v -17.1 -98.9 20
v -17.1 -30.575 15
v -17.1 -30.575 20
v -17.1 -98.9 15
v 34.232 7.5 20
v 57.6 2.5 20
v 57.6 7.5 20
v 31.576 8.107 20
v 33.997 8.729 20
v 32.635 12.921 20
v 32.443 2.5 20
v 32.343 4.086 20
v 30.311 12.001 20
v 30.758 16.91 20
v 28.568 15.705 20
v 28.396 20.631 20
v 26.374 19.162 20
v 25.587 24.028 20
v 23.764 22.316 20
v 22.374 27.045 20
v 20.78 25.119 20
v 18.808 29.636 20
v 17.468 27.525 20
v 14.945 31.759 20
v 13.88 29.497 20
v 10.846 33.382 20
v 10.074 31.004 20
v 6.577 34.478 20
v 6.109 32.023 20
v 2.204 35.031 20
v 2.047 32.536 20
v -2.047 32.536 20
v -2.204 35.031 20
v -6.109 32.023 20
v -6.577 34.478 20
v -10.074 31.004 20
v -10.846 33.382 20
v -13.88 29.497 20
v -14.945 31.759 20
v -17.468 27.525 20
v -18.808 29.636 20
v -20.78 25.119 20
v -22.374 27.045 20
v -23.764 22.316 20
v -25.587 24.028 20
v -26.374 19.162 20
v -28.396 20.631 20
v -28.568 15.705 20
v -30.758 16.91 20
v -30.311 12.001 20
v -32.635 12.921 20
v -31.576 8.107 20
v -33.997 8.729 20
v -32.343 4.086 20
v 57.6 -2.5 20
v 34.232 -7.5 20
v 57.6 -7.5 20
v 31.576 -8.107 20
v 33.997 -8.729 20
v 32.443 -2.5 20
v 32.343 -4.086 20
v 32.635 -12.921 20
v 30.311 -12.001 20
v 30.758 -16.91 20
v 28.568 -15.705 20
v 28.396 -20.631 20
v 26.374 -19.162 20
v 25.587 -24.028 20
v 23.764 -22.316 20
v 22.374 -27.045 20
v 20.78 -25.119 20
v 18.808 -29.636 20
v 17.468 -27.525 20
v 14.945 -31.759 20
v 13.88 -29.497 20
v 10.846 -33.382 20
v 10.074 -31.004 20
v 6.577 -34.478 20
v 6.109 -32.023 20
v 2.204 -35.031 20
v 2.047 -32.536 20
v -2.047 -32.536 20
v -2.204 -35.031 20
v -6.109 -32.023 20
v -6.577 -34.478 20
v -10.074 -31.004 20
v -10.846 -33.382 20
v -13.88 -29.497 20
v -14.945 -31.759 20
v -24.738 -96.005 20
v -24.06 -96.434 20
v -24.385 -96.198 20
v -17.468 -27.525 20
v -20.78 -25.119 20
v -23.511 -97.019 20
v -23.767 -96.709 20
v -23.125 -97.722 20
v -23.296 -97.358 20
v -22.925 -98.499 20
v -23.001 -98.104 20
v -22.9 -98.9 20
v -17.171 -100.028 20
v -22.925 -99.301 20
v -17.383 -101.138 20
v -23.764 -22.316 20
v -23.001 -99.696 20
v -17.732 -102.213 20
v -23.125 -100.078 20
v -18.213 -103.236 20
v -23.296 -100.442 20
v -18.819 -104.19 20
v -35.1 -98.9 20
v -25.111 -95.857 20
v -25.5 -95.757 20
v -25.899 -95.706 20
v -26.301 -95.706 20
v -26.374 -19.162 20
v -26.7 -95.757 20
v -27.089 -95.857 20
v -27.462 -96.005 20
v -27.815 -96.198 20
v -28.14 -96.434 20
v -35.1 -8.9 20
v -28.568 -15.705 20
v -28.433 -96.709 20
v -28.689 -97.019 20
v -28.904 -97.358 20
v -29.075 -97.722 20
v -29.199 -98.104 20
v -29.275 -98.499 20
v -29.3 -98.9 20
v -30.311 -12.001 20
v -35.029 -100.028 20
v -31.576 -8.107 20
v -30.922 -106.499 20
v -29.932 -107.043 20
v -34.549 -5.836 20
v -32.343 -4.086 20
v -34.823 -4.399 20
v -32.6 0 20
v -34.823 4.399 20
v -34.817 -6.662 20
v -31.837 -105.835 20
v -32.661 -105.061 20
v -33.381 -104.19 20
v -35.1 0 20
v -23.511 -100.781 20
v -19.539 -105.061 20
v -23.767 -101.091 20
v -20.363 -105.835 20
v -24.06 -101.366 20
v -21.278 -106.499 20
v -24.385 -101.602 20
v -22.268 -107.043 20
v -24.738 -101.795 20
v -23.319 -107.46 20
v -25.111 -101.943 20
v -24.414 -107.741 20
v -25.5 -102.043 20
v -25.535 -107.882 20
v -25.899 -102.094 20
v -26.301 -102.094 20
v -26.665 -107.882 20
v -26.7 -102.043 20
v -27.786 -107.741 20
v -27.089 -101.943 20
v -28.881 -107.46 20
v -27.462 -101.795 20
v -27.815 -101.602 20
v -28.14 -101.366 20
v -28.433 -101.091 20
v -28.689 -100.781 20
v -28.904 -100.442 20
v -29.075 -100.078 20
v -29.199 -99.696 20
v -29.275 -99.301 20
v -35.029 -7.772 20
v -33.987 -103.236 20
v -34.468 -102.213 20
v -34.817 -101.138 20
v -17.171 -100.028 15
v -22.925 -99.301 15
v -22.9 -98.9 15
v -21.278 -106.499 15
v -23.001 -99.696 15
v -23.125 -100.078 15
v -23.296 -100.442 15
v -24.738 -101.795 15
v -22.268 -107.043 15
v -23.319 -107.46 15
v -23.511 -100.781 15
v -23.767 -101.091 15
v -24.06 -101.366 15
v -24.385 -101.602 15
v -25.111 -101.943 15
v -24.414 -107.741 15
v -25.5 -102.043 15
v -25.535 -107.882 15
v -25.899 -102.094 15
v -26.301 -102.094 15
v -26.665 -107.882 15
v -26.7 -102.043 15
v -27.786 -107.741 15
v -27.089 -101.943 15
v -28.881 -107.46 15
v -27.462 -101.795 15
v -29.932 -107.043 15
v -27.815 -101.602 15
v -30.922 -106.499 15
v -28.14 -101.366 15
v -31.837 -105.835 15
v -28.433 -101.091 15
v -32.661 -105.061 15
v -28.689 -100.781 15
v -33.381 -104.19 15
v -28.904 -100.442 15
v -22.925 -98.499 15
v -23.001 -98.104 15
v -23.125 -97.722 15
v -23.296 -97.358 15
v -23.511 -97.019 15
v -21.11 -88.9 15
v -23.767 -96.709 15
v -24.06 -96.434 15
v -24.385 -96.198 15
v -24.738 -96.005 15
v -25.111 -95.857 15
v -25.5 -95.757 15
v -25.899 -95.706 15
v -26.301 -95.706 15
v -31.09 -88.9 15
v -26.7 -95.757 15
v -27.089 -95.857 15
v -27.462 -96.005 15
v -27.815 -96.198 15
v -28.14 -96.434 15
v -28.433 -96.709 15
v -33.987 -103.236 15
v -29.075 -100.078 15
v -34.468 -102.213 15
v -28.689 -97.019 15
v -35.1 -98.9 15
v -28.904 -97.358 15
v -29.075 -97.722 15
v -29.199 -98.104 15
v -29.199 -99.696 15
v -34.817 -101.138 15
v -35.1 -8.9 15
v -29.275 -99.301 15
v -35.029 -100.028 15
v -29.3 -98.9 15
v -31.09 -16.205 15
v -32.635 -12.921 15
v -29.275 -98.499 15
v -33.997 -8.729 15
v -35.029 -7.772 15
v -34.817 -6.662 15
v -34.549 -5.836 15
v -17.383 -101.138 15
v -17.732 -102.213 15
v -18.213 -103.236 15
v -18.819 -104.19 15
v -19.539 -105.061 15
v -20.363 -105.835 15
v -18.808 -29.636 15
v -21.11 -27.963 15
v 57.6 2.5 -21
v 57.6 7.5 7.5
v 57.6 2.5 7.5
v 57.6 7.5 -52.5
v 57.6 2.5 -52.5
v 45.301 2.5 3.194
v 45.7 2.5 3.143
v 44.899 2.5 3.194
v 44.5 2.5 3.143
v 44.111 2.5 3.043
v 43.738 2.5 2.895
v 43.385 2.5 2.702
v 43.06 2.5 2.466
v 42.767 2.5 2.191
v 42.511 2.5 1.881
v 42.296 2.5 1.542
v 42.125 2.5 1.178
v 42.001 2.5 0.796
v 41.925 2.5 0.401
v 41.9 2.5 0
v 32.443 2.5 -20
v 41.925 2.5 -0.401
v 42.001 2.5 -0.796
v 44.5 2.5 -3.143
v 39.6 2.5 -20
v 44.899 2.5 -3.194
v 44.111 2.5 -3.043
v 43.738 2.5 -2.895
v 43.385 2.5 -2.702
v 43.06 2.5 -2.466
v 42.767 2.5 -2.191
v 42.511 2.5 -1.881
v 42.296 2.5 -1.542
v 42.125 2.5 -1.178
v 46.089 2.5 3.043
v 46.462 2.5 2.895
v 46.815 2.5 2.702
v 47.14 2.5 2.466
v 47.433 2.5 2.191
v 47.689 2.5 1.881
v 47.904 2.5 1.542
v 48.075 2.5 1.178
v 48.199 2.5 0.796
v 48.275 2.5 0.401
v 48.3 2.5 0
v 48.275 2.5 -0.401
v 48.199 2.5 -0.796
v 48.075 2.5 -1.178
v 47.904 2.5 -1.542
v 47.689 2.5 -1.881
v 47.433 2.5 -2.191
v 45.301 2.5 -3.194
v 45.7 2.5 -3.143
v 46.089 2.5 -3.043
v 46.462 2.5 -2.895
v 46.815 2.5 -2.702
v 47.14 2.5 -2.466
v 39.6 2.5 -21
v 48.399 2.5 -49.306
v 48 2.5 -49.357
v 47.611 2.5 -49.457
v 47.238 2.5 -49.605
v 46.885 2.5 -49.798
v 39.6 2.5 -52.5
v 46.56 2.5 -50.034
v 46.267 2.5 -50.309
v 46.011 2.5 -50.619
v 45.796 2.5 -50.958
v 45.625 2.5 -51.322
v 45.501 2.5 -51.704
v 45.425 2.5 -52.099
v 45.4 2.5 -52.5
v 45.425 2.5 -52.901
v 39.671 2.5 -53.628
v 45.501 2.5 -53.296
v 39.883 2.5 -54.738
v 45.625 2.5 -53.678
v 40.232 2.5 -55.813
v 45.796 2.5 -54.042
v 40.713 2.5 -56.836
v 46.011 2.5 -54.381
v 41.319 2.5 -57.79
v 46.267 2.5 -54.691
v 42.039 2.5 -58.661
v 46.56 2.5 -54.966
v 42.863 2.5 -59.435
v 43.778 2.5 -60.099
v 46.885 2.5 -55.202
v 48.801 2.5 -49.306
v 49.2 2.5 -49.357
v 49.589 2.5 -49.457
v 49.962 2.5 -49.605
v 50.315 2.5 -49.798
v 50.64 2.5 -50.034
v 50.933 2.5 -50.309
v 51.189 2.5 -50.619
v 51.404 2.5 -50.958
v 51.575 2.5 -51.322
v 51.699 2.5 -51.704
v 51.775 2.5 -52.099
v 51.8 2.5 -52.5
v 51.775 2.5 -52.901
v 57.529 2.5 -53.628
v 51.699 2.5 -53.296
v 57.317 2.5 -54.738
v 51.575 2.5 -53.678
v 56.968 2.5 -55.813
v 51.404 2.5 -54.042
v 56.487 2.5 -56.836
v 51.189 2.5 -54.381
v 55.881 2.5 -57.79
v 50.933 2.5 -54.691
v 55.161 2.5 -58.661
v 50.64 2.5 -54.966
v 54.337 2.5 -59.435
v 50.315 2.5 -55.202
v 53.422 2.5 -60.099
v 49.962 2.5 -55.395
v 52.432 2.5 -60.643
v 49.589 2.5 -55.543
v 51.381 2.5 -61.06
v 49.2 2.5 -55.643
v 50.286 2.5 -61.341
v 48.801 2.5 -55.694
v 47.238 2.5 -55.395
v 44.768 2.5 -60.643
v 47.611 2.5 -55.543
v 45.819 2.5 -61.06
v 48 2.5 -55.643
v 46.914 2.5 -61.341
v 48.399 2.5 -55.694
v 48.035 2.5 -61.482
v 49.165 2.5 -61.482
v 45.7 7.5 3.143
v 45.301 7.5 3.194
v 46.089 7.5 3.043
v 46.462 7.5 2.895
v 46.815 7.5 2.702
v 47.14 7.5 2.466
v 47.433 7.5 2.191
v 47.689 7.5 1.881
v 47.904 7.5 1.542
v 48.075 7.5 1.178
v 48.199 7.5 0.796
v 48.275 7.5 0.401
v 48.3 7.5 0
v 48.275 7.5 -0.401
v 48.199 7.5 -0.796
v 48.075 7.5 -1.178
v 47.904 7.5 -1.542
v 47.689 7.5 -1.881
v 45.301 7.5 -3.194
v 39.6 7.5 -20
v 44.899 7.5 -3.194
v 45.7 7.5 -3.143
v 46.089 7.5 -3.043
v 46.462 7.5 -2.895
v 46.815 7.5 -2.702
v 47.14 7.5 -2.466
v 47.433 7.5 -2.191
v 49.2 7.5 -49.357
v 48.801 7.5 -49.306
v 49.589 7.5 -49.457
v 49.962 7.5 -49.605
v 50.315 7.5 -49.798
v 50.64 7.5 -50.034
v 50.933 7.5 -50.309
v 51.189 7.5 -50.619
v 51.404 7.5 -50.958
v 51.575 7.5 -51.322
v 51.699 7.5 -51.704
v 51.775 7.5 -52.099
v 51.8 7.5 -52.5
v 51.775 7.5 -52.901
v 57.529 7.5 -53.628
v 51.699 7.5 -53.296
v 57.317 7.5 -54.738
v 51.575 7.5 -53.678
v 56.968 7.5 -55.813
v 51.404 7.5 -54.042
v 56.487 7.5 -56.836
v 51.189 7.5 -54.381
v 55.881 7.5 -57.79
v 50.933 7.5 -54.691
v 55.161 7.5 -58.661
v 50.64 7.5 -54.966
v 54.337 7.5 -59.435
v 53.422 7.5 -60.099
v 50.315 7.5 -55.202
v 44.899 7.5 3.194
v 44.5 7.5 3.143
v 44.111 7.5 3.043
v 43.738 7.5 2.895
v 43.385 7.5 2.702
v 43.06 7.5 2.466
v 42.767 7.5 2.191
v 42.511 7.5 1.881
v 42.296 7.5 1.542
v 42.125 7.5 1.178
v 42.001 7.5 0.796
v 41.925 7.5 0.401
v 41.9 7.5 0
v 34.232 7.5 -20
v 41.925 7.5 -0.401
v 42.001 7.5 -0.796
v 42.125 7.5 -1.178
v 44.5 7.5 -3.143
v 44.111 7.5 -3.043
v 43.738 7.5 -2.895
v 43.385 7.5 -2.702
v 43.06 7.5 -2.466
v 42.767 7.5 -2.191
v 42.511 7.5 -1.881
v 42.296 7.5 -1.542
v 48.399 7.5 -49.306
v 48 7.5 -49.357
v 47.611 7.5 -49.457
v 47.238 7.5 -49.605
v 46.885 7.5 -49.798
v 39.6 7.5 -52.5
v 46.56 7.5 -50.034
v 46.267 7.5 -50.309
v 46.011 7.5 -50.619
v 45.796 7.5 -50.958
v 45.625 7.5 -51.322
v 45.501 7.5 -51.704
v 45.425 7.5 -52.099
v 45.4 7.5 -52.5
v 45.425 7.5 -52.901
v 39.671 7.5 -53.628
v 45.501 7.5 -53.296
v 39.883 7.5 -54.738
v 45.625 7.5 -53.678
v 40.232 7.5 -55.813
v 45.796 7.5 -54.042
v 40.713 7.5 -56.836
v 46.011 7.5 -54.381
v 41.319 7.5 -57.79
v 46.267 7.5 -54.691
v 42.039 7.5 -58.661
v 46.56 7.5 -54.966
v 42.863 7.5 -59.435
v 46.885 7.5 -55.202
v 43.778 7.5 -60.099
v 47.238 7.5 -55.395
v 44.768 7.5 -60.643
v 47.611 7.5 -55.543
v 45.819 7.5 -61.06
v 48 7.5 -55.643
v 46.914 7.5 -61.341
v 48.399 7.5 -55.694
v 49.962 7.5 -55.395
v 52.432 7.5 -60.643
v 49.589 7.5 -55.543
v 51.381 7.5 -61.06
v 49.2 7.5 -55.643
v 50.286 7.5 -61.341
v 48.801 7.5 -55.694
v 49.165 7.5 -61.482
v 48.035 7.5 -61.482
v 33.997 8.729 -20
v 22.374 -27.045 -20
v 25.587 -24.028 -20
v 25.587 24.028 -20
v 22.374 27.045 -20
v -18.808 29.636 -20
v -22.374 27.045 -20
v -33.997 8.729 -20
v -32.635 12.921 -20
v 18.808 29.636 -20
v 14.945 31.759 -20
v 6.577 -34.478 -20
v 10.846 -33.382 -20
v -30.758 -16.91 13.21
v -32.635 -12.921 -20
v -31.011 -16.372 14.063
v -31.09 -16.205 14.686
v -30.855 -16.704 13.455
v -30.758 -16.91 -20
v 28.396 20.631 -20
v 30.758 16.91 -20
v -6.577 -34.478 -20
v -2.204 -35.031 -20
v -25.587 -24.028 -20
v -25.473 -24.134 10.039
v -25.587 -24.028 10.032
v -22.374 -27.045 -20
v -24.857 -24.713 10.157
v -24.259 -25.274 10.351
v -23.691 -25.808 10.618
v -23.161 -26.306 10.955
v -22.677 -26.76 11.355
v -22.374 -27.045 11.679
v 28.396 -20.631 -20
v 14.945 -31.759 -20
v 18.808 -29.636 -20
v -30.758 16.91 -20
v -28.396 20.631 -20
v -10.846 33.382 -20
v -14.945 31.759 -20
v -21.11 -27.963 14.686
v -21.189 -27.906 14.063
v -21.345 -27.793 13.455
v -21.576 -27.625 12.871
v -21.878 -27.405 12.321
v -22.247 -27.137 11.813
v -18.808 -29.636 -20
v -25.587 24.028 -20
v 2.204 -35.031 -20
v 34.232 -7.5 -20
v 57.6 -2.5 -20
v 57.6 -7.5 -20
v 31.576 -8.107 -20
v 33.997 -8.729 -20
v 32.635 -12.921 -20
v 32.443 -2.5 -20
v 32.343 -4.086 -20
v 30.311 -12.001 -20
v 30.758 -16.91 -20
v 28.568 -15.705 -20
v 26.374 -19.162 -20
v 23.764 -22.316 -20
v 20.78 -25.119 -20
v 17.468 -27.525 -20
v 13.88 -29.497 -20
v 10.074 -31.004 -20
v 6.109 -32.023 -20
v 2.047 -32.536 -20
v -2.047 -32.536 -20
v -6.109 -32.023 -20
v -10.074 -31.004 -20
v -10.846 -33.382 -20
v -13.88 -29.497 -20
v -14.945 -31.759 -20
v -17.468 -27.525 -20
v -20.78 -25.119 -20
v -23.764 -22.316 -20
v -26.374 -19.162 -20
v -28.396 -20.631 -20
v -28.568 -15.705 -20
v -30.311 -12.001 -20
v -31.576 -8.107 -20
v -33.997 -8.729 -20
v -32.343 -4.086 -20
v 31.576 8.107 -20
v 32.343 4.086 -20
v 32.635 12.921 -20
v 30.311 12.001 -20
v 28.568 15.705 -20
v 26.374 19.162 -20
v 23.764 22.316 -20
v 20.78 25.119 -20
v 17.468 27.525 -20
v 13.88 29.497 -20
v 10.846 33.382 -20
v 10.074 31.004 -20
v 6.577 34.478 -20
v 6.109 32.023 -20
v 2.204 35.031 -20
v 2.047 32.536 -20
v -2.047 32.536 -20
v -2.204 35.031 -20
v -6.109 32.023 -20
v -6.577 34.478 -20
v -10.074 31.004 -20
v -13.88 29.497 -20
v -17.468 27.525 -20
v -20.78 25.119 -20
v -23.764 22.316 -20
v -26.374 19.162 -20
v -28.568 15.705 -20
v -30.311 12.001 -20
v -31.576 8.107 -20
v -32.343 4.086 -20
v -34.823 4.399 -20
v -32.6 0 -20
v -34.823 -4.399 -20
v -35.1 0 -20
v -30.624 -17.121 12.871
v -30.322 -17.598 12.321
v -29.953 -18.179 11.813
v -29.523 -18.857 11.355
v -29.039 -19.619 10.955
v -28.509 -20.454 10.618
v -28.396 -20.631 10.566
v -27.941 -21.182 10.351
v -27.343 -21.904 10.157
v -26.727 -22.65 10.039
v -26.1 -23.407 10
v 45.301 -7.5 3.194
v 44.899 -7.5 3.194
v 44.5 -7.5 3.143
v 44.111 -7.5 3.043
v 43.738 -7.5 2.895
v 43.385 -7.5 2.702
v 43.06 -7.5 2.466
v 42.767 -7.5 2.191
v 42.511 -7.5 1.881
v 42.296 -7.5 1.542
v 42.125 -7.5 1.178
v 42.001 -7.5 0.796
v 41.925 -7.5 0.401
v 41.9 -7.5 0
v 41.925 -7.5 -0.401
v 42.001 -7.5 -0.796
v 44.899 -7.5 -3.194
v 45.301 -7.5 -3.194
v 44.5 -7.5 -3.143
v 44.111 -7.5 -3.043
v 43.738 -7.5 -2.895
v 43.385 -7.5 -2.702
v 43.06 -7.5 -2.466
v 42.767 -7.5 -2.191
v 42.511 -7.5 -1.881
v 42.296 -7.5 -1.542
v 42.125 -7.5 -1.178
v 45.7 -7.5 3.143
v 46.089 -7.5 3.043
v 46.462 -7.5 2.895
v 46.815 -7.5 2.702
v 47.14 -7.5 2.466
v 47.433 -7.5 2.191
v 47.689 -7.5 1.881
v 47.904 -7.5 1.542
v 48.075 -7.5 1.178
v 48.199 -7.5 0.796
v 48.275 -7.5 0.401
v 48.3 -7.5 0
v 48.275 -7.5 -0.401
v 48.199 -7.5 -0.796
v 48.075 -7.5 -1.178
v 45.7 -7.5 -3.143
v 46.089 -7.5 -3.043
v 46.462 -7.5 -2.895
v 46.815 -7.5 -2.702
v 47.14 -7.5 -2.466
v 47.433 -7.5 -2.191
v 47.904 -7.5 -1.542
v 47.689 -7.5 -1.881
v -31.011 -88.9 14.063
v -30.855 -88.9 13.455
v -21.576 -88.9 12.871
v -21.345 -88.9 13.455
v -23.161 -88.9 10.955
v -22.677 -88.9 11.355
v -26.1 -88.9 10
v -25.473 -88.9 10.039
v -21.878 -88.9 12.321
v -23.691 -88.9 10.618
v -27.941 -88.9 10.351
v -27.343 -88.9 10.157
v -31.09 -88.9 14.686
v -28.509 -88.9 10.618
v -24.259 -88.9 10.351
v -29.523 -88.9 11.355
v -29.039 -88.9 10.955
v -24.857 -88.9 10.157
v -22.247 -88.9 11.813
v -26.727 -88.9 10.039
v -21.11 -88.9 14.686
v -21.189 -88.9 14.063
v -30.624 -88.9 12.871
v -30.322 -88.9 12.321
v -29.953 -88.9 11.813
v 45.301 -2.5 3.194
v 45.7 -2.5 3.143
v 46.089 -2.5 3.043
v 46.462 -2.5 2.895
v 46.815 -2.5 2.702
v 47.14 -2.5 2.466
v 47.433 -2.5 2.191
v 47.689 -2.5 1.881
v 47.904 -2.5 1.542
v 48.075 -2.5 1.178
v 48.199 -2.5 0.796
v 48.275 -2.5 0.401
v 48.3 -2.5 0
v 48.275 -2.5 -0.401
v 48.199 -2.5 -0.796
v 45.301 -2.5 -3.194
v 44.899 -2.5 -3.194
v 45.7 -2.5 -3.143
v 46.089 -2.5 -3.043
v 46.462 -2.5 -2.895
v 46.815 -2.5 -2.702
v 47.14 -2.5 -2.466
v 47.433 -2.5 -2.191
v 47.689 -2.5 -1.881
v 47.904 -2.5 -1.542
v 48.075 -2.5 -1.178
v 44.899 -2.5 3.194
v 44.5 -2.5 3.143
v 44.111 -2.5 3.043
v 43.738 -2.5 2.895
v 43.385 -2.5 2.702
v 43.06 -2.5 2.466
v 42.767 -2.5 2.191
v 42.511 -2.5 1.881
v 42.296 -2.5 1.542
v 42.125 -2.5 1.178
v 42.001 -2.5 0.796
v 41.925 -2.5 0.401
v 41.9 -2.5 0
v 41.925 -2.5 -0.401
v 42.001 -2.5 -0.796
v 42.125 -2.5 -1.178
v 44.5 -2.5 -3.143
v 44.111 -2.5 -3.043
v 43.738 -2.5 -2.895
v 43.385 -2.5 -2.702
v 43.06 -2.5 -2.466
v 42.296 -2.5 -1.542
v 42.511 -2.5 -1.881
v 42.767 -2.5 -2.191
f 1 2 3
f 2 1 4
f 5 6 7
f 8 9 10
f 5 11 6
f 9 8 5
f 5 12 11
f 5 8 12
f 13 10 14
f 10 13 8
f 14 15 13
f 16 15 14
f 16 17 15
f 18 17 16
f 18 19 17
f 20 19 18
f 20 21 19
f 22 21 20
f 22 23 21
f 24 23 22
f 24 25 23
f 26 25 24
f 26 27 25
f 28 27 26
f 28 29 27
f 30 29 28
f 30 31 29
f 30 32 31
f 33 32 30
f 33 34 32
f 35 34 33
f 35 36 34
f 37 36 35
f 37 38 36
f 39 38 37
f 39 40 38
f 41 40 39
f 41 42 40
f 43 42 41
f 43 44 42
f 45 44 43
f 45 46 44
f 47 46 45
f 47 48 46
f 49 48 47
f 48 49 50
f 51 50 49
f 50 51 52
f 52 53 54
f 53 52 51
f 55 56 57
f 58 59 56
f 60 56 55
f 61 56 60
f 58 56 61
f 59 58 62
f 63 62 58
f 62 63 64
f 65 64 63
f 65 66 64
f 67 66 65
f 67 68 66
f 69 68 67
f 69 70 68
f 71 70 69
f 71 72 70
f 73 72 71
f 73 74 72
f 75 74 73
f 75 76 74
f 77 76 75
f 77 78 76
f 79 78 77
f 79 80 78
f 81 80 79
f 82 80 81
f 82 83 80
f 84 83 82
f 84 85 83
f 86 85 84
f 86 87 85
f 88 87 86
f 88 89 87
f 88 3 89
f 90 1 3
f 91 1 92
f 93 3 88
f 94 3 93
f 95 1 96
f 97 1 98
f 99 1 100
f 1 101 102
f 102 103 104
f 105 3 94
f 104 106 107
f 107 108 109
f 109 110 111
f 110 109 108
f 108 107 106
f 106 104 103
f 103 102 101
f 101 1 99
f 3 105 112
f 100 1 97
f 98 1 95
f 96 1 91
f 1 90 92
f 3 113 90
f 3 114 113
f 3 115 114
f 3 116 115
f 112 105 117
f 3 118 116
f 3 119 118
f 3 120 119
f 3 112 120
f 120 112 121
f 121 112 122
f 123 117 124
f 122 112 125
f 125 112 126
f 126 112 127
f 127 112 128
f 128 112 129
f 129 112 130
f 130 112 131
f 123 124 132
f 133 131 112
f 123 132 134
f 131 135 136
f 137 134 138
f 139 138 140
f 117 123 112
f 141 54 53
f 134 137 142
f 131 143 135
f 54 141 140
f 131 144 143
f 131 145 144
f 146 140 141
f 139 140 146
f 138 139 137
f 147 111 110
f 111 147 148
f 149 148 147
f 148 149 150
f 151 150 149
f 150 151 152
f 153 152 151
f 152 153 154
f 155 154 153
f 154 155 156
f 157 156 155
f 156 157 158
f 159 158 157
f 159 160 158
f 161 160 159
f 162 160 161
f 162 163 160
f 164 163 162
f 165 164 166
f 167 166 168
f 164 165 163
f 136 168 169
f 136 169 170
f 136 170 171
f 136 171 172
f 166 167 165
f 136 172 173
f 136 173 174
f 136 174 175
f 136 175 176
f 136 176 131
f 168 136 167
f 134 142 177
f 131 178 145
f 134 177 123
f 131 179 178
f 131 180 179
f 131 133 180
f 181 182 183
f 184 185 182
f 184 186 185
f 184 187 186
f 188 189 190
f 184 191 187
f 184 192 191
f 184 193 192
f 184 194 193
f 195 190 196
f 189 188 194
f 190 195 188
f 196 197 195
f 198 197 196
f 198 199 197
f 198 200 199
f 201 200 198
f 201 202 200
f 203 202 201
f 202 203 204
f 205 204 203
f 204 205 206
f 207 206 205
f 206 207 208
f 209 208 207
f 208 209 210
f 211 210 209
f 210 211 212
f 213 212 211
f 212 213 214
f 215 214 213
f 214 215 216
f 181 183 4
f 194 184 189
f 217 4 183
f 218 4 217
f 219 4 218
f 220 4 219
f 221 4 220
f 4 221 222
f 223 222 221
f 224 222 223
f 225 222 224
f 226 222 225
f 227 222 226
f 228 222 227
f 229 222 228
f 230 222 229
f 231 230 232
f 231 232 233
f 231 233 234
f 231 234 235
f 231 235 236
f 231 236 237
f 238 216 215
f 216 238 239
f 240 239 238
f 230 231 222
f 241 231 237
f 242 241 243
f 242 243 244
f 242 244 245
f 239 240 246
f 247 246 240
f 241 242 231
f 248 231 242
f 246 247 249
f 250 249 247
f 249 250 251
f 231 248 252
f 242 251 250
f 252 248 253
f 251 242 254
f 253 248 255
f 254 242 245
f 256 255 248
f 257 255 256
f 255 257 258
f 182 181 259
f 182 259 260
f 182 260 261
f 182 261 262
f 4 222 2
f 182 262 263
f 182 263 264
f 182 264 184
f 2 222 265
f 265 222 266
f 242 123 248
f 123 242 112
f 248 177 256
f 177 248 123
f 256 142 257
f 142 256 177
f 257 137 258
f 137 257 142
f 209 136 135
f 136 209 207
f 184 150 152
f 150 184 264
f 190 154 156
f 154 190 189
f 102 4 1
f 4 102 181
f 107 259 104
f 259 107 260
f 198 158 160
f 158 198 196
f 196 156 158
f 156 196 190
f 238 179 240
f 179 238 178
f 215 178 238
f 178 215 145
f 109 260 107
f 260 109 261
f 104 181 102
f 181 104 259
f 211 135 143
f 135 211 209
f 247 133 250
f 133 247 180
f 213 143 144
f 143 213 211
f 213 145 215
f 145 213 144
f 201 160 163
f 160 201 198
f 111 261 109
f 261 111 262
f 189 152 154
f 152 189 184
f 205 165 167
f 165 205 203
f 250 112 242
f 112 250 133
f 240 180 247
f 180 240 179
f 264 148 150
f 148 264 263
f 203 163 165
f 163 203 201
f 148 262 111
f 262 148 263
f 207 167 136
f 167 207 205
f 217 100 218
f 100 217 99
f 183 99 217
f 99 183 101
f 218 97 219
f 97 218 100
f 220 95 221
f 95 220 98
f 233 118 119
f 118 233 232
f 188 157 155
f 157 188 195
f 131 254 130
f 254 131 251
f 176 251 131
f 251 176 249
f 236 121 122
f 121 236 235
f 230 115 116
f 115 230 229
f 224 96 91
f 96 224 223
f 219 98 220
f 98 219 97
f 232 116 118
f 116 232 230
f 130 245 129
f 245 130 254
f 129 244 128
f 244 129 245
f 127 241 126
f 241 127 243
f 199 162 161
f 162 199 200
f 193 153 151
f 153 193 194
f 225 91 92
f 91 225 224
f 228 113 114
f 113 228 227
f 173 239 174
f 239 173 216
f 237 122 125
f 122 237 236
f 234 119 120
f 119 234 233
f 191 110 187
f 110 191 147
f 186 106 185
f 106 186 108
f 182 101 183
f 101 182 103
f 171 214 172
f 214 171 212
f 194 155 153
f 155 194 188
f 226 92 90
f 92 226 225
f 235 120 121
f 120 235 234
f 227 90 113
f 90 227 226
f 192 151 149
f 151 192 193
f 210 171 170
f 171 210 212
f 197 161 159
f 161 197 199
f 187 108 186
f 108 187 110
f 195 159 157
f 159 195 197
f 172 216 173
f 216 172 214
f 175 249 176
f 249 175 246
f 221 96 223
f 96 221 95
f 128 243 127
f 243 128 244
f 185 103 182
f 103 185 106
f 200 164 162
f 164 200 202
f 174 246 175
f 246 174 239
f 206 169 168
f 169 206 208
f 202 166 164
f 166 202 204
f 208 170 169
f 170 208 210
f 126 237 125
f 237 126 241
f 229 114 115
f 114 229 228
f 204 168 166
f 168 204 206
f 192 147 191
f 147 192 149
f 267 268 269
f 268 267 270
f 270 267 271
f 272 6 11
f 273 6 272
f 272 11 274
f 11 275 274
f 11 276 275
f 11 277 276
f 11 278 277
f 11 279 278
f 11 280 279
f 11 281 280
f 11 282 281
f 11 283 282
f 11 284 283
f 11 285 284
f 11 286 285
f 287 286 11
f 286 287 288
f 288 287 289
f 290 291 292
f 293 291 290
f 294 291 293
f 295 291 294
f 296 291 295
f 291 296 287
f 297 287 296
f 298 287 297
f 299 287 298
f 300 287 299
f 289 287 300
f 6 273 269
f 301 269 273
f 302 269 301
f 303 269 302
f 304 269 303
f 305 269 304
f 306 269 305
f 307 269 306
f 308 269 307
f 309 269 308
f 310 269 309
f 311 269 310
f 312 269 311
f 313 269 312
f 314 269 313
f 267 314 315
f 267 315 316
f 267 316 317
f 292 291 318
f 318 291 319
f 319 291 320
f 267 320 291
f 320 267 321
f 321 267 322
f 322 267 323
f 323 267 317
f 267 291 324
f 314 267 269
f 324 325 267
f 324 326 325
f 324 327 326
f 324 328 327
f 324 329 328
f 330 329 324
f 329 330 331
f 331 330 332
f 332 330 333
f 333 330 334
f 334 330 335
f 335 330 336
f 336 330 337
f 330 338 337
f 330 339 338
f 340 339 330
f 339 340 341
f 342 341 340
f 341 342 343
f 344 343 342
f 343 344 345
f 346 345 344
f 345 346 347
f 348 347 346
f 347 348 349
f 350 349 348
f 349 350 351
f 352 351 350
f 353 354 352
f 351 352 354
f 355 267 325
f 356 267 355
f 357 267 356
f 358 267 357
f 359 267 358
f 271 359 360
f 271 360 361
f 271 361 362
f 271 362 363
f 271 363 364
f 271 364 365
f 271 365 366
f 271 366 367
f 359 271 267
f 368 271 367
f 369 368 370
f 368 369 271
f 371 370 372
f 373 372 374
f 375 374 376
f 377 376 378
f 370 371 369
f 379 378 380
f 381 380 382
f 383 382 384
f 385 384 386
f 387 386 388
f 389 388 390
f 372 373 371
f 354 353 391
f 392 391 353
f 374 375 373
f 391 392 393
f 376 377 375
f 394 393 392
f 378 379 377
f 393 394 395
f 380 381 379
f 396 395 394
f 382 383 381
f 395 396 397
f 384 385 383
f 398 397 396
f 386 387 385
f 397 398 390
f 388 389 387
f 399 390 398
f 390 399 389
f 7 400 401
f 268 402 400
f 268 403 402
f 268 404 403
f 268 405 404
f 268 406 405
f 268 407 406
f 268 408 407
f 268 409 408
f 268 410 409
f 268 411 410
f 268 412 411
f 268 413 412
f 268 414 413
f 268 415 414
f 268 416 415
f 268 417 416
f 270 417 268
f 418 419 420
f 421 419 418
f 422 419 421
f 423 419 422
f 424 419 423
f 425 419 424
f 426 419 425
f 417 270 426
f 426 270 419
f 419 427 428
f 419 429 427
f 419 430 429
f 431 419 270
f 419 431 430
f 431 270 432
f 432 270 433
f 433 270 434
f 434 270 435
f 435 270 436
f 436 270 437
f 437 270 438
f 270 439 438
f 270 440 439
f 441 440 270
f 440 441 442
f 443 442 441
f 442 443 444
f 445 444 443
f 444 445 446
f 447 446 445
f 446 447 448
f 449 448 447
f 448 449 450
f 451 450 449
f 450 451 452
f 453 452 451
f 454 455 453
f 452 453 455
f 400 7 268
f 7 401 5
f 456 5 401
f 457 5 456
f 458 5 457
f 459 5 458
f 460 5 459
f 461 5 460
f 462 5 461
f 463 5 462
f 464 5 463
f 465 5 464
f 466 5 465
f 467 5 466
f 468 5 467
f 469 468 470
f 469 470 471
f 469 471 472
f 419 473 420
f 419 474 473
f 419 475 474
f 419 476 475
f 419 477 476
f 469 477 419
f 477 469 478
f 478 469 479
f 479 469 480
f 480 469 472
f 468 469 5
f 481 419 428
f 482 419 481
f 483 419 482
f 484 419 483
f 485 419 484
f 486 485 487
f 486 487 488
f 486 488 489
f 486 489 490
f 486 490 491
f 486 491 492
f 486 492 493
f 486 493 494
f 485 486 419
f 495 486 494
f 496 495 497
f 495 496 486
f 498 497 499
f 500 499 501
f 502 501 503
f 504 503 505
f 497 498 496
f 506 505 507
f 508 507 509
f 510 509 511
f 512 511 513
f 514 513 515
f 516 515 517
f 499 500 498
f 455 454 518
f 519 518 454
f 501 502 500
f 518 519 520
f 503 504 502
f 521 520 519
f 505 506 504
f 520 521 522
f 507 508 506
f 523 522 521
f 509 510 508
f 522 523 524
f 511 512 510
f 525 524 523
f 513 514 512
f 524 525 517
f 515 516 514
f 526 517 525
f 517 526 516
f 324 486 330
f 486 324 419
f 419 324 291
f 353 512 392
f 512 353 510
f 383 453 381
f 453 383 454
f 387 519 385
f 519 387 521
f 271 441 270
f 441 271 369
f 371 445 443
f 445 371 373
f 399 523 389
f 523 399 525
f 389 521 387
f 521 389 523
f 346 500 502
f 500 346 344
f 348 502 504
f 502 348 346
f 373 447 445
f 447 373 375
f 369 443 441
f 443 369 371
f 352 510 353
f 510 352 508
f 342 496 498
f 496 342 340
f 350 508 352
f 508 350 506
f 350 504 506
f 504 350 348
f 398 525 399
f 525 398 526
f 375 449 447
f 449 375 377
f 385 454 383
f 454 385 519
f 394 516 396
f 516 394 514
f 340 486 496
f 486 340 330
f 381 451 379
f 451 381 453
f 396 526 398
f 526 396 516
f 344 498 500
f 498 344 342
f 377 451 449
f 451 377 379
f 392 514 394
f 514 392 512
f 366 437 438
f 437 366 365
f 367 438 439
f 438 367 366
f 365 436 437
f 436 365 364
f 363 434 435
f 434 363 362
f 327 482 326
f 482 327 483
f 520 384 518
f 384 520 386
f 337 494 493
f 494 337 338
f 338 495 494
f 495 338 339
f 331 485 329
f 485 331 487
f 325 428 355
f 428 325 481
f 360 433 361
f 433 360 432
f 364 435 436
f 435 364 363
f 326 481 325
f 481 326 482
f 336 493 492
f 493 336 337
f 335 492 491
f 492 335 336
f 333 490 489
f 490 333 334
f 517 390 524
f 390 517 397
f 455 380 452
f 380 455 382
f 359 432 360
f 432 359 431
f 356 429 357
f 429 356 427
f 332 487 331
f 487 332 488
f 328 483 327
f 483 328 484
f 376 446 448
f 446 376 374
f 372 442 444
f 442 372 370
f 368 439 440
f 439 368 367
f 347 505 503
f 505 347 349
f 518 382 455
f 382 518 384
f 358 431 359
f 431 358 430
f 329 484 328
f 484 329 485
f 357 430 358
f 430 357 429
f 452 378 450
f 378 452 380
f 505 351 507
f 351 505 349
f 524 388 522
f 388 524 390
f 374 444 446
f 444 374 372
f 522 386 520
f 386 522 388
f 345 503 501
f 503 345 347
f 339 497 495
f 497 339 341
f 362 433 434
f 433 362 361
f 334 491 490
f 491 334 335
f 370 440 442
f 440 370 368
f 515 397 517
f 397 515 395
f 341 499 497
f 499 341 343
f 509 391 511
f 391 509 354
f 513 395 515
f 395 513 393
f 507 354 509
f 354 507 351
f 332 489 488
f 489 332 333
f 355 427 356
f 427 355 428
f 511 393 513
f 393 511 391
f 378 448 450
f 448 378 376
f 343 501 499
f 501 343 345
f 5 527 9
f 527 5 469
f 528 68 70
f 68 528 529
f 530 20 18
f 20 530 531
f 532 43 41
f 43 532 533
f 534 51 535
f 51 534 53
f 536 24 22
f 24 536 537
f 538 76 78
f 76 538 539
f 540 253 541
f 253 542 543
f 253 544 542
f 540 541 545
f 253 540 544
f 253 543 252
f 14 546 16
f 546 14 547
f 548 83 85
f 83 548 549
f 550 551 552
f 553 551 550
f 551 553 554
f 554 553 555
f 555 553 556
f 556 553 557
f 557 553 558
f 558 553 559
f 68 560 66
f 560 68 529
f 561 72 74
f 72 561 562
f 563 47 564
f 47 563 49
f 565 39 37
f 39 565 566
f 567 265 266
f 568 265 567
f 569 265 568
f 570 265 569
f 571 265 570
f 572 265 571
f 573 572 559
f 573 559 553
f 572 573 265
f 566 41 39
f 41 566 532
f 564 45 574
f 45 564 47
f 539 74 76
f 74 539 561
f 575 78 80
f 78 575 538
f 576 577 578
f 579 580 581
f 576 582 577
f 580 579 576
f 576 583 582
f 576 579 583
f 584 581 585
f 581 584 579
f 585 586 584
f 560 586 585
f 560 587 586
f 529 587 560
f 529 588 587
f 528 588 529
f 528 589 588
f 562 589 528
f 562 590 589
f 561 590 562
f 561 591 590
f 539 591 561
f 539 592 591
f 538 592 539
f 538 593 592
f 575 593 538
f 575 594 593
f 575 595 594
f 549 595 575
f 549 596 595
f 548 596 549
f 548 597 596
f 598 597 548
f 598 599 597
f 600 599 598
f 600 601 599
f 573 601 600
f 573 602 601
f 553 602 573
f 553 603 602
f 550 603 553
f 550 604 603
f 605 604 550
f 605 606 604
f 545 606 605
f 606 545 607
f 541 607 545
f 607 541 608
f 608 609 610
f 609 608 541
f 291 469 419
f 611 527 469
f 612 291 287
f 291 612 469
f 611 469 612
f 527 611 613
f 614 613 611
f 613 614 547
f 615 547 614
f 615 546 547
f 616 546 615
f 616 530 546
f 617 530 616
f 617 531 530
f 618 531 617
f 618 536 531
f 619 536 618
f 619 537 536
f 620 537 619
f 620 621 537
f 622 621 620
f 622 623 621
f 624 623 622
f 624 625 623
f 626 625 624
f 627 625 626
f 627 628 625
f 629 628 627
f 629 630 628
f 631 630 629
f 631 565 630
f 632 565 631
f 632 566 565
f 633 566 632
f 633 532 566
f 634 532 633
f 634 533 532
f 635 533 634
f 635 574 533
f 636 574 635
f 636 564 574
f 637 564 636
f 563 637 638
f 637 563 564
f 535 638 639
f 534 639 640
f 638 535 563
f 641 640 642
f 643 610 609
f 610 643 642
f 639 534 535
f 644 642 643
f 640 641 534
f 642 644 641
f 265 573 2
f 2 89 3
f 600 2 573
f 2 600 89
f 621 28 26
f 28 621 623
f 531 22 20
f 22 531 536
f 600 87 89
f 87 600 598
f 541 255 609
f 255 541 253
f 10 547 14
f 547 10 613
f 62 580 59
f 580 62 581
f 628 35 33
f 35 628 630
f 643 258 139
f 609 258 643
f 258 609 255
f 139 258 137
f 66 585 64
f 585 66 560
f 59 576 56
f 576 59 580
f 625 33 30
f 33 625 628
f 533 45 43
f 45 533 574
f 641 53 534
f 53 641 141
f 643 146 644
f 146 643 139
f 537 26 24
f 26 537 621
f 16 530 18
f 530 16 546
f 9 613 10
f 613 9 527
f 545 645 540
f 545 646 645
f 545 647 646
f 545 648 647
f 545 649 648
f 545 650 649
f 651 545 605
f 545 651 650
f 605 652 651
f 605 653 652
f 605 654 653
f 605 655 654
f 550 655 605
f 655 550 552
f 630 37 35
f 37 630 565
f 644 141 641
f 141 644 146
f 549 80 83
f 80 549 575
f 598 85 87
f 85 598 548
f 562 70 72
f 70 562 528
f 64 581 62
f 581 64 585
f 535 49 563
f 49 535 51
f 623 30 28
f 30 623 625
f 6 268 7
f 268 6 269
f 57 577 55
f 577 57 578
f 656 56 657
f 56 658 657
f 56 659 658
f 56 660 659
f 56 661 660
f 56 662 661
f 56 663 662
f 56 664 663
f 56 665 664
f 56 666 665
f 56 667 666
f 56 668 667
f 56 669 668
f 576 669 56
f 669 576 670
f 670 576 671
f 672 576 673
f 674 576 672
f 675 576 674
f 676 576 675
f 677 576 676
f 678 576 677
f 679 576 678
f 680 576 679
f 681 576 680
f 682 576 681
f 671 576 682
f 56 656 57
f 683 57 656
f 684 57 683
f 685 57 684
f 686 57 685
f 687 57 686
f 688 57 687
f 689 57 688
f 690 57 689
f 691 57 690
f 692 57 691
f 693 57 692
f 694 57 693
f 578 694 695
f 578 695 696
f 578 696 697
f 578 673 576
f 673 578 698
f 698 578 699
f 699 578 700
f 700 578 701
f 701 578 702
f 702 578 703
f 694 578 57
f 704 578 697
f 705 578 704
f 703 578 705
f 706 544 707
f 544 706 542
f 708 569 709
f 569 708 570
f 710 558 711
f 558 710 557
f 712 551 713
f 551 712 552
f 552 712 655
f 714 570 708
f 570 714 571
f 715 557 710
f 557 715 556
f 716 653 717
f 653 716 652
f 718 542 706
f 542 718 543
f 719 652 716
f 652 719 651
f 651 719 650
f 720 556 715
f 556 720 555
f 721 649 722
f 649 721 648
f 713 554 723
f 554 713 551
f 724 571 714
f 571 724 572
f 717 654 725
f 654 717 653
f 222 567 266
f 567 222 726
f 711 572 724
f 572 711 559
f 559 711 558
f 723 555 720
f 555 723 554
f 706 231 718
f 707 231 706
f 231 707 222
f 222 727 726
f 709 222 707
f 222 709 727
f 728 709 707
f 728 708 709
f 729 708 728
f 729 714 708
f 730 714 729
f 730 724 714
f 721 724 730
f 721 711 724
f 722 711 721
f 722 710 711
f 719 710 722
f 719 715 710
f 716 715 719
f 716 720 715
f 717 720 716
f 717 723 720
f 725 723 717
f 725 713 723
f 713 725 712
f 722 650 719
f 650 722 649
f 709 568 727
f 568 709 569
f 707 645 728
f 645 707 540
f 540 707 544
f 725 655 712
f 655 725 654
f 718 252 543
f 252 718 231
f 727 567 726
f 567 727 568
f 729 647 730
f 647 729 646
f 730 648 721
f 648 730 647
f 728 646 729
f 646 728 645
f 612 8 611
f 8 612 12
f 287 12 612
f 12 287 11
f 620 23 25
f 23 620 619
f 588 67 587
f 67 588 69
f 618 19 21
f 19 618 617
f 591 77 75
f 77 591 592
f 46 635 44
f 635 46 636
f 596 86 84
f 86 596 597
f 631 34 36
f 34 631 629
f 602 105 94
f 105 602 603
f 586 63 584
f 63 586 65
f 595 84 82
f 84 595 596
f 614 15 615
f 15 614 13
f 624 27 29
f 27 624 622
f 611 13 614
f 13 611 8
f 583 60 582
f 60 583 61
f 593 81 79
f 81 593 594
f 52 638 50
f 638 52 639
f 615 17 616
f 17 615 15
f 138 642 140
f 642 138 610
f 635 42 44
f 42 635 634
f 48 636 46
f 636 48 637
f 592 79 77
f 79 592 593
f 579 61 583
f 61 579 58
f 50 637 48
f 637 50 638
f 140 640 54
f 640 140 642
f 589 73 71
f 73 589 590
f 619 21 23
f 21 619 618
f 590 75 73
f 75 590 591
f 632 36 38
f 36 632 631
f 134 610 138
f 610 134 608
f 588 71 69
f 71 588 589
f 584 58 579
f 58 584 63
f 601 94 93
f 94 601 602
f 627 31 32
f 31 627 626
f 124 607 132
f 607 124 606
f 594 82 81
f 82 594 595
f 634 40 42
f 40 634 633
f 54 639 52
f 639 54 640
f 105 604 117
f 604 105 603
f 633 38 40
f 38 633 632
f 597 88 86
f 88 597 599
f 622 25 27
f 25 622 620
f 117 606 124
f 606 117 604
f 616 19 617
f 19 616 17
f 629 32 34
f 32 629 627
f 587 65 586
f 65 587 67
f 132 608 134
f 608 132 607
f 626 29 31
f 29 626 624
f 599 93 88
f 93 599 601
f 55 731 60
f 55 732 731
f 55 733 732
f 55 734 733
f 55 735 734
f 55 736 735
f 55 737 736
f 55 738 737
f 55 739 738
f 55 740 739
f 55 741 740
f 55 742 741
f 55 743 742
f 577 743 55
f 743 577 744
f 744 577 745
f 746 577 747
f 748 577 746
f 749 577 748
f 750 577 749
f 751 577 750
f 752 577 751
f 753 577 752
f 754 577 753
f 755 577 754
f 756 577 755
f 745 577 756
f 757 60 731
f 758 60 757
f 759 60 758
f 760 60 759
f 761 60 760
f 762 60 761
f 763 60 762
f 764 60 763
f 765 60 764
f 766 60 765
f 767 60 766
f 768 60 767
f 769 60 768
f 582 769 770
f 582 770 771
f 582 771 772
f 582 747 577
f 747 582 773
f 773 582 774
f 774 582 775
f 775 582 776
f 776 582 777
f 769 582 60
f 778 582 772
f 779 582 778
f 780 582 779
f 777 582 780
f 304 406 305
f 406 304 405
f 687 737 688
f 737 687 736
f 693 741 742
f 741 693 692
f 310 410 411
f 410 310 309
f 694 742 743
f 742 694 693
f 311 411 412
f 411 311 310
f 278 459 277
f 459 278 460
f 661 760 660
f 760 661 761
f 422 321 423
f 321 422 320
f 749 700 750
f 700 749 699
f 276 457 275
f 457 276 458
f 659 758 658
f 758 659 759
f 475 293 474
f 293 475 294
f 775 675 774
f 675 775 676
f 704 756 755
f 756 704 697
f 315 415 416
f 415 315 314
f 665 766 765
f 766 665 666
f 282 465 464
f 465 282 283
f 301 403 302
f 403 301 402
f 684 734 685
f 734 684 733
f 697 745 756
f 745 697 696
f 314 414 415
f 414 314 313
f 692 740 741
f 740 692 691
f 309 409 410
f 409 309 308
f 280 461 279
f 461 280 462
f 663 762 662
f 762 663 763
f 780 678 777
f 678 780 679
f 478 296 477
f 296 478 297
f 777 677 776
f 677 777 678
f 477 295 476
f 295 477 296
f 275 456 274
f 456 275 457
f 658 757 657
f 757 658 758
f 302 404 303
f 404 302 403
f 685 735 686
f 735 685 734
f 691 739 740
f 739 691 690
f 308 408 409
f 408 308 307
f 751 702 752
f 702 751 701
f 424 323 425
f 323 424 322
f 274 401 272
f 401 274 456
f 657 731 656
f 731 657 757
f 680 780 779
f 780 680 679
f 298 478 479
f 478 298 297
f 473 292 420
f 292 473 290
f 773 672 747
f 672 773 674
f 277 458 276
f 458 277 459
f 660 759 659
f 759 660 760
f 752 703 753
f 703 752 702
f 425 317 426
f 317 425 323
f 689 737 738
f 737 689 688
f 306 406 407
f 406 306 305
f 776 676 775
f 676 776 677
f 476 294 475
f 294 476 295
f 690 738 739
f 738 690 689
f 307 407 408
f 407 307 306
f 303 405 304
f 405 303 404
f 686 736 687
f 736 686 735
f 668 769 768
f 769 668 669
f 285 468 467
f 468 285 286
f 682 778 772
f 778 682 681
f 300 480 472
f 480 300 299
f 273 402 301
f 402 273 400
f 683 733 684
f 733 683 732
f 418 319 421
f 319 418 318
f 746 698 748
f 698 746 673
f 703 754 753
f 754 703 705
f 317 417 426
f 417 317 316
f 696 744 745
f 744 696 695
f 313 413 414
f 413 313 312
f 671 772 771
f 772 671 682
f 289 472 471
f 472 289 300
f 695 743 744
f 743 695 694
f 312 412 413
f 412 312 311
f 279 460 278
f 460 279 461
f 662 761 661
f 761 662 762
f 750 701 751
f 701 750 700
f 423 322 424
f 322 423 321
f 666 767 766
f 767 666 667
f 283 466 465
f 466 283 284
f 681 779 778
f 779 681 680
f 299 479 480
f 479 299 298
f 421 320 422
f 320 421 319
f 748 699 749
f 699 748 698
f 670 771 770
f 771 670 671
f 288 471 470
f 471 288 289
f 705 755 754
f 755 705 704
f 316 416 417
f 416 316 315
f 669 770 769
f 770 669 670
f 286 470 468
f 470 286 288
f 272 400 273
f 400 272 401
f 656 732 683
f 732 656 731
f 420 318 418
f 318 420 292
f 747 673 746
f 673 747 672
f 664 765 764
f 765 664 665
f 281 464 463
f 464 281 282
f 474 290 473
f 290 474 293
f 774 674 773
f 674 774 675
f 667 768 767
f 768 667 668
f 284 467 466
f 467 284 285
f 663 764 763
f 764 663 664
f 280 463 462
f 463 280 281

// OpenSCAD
/* Open SCAD Name.: CNC_Indicator_Collar_v1.scad
*  Copyright (c)..: 2017 www.DIY3DTech.com
*
*  Creation Date..: 08/03/2017
*  Description....: Collar CNC Dial Indicator
*
*  Rev 1: Develop Model
*  Rev 2: 
*
*  This program is free software; you can redistribute it and/or modify
*  it under the terms of the GNU General Public License as published by
*  the Free Software Foundation; either version 2 of the License, or
*  (at your option) any later version.
*
*  This program is distributed in the hope that it will be useful,
*  but WITHOUT ANY WARRANTY; without even the implied warranty of
*  MERCHANTABILITY or FITNESS FOR A PARTICULAR PURPOSE.  See the
*  GNU General Public License for more details.
*  This version is for non-comerical use only.
*/ 

/*------------------Customizer View-------------------*/

// preview[view:north, tilt:top]

/*---------------------Parameters---------------------*/

//Dia of Spindle in mm (0.2mm is for contraction)
spindle_dia     =   65.2;//[50.2:1:75.2]

//Wall Thickness in mm
wall_Thick      =    5;//[3:1:5]

//Height of collar in mm
collar_height   =   40;//[40:1:50]

//Lengeth of x/y mount in mm
x_length       =    90;//[100:2:200]

//Lengeth of z mount in mm
z_length        =   20;//[10:1:30]

//Mount width in mm (do not recommend changing)
mount_width     =   18;//[18:1:20]


/*-----------------------Execute----------------------*/

main_module();

/*-----------------------Modules----------------------*/

module main_module(){ //create module
    difference() {
            union() {//start union
                
                //crreate main body of collar
                translate ([0,0,0]) rotate ([0,0,0]) cylinder(collar_height,(spindle_dia+wall_Thick)/2,(spindle_dia+wall_Thick)/2,$fn=50,true);
                
                //create cinch tab
                translate ([spindle_dia/2,0,0]) rotate ([0,0,0]) cube([50,15,collar_height],true);
                
                //create x mounts
                translate ([-((spindle_dia+wall_Thick)/2)+(mount_width/2),-((spindle_dia+wall_Thick))+(spindle_dia/4),(collar_height/2)-2.5]) rotate ([0,0,0]) oblong(mount_width,x_length,5,0,6.4,true);
                
                //create x support
                translate ([-((spindle_dia+wall_Thick)/2)+(mount_width/2),-((spindle_dia+wall_Thick))+(spindle_dia/4)+10,(collar_height/2)-5]) rotate ([90,90,0]) cylinder(x_length,10/2,10/2,$fn=50,true);
                                
                //create z mount
                translate ([(spindle_dia+mount_width+14)/2,5,-z_length-2.5]) rotate ([90,0,0])oblong(18,(z_length+collar_height),5,0,6.4,true);
                
                    } //end union
                            
    //start subtraction of difference
                    
                //Differance center of collar
                translate ([0,0,0]) rotate ([0,0,0]) cylinder(collar_height*2,(spindle_dia)/2,(spindle_dia)/2,$fn=50,true);
                    
                //create opening for cinch
                translate ([spindle_dia/2,0,0]) rotate ([0,0,0]) cube([52,5,collar_height+2],true);
                    
                //create hole for cinch bolt
                translate ([(spindle_dia+25)/2,0,0]) rotate ([90,0,0]) cylinder(20,6.4/2,6.4/2,$fn=50,true);
                                               
    } //end difference
}//end module

module oblong(dia,len,tall,hole_1,hole_2,center){
    difference() {
        union() {
            //create base oblong structure
            cube([dia,len,tall], center);
            translate ([0,len/2,0]) {cylinder(tall,dia/2,dia/2,$fn=50, center);
            }
            translate ([0,-len/2,0]) {cylinder(tall,dia/2,dia/2,$fn=50, center);
            }
        } //end union
     //if hole is greater than zero, remove hole otherwise do nothing   
     if (hole_1>0) {
        translate ([0,len/2,-1]) {cylinder(tall+3,hole_1/2,hole_1/2,$fn=50, center);
        }}
        if (hole_2>0) {
        translate ([0,-len/2,-1]) {cylinder(tall+3,hole_2/2,hole_2/2,$fn=50, center);
        }}
    } //end differance
}//end module

                 
/*----------------------End Code----------------------*/
//translate ([0,0,0]) rotate ([0,0,0]) cylinder(5,3,3,true);
//translate ([0,0,0]) rotate ([0,0,0]) cube([18,18,18],true);
//translate ([0,0,0]) sphere($fn = 0, $fa = 12, $fs = 2, r = 1);
//translate ([0,0,0]) rotate ([0,0,0]) rounded (15,15,1,1,true);
